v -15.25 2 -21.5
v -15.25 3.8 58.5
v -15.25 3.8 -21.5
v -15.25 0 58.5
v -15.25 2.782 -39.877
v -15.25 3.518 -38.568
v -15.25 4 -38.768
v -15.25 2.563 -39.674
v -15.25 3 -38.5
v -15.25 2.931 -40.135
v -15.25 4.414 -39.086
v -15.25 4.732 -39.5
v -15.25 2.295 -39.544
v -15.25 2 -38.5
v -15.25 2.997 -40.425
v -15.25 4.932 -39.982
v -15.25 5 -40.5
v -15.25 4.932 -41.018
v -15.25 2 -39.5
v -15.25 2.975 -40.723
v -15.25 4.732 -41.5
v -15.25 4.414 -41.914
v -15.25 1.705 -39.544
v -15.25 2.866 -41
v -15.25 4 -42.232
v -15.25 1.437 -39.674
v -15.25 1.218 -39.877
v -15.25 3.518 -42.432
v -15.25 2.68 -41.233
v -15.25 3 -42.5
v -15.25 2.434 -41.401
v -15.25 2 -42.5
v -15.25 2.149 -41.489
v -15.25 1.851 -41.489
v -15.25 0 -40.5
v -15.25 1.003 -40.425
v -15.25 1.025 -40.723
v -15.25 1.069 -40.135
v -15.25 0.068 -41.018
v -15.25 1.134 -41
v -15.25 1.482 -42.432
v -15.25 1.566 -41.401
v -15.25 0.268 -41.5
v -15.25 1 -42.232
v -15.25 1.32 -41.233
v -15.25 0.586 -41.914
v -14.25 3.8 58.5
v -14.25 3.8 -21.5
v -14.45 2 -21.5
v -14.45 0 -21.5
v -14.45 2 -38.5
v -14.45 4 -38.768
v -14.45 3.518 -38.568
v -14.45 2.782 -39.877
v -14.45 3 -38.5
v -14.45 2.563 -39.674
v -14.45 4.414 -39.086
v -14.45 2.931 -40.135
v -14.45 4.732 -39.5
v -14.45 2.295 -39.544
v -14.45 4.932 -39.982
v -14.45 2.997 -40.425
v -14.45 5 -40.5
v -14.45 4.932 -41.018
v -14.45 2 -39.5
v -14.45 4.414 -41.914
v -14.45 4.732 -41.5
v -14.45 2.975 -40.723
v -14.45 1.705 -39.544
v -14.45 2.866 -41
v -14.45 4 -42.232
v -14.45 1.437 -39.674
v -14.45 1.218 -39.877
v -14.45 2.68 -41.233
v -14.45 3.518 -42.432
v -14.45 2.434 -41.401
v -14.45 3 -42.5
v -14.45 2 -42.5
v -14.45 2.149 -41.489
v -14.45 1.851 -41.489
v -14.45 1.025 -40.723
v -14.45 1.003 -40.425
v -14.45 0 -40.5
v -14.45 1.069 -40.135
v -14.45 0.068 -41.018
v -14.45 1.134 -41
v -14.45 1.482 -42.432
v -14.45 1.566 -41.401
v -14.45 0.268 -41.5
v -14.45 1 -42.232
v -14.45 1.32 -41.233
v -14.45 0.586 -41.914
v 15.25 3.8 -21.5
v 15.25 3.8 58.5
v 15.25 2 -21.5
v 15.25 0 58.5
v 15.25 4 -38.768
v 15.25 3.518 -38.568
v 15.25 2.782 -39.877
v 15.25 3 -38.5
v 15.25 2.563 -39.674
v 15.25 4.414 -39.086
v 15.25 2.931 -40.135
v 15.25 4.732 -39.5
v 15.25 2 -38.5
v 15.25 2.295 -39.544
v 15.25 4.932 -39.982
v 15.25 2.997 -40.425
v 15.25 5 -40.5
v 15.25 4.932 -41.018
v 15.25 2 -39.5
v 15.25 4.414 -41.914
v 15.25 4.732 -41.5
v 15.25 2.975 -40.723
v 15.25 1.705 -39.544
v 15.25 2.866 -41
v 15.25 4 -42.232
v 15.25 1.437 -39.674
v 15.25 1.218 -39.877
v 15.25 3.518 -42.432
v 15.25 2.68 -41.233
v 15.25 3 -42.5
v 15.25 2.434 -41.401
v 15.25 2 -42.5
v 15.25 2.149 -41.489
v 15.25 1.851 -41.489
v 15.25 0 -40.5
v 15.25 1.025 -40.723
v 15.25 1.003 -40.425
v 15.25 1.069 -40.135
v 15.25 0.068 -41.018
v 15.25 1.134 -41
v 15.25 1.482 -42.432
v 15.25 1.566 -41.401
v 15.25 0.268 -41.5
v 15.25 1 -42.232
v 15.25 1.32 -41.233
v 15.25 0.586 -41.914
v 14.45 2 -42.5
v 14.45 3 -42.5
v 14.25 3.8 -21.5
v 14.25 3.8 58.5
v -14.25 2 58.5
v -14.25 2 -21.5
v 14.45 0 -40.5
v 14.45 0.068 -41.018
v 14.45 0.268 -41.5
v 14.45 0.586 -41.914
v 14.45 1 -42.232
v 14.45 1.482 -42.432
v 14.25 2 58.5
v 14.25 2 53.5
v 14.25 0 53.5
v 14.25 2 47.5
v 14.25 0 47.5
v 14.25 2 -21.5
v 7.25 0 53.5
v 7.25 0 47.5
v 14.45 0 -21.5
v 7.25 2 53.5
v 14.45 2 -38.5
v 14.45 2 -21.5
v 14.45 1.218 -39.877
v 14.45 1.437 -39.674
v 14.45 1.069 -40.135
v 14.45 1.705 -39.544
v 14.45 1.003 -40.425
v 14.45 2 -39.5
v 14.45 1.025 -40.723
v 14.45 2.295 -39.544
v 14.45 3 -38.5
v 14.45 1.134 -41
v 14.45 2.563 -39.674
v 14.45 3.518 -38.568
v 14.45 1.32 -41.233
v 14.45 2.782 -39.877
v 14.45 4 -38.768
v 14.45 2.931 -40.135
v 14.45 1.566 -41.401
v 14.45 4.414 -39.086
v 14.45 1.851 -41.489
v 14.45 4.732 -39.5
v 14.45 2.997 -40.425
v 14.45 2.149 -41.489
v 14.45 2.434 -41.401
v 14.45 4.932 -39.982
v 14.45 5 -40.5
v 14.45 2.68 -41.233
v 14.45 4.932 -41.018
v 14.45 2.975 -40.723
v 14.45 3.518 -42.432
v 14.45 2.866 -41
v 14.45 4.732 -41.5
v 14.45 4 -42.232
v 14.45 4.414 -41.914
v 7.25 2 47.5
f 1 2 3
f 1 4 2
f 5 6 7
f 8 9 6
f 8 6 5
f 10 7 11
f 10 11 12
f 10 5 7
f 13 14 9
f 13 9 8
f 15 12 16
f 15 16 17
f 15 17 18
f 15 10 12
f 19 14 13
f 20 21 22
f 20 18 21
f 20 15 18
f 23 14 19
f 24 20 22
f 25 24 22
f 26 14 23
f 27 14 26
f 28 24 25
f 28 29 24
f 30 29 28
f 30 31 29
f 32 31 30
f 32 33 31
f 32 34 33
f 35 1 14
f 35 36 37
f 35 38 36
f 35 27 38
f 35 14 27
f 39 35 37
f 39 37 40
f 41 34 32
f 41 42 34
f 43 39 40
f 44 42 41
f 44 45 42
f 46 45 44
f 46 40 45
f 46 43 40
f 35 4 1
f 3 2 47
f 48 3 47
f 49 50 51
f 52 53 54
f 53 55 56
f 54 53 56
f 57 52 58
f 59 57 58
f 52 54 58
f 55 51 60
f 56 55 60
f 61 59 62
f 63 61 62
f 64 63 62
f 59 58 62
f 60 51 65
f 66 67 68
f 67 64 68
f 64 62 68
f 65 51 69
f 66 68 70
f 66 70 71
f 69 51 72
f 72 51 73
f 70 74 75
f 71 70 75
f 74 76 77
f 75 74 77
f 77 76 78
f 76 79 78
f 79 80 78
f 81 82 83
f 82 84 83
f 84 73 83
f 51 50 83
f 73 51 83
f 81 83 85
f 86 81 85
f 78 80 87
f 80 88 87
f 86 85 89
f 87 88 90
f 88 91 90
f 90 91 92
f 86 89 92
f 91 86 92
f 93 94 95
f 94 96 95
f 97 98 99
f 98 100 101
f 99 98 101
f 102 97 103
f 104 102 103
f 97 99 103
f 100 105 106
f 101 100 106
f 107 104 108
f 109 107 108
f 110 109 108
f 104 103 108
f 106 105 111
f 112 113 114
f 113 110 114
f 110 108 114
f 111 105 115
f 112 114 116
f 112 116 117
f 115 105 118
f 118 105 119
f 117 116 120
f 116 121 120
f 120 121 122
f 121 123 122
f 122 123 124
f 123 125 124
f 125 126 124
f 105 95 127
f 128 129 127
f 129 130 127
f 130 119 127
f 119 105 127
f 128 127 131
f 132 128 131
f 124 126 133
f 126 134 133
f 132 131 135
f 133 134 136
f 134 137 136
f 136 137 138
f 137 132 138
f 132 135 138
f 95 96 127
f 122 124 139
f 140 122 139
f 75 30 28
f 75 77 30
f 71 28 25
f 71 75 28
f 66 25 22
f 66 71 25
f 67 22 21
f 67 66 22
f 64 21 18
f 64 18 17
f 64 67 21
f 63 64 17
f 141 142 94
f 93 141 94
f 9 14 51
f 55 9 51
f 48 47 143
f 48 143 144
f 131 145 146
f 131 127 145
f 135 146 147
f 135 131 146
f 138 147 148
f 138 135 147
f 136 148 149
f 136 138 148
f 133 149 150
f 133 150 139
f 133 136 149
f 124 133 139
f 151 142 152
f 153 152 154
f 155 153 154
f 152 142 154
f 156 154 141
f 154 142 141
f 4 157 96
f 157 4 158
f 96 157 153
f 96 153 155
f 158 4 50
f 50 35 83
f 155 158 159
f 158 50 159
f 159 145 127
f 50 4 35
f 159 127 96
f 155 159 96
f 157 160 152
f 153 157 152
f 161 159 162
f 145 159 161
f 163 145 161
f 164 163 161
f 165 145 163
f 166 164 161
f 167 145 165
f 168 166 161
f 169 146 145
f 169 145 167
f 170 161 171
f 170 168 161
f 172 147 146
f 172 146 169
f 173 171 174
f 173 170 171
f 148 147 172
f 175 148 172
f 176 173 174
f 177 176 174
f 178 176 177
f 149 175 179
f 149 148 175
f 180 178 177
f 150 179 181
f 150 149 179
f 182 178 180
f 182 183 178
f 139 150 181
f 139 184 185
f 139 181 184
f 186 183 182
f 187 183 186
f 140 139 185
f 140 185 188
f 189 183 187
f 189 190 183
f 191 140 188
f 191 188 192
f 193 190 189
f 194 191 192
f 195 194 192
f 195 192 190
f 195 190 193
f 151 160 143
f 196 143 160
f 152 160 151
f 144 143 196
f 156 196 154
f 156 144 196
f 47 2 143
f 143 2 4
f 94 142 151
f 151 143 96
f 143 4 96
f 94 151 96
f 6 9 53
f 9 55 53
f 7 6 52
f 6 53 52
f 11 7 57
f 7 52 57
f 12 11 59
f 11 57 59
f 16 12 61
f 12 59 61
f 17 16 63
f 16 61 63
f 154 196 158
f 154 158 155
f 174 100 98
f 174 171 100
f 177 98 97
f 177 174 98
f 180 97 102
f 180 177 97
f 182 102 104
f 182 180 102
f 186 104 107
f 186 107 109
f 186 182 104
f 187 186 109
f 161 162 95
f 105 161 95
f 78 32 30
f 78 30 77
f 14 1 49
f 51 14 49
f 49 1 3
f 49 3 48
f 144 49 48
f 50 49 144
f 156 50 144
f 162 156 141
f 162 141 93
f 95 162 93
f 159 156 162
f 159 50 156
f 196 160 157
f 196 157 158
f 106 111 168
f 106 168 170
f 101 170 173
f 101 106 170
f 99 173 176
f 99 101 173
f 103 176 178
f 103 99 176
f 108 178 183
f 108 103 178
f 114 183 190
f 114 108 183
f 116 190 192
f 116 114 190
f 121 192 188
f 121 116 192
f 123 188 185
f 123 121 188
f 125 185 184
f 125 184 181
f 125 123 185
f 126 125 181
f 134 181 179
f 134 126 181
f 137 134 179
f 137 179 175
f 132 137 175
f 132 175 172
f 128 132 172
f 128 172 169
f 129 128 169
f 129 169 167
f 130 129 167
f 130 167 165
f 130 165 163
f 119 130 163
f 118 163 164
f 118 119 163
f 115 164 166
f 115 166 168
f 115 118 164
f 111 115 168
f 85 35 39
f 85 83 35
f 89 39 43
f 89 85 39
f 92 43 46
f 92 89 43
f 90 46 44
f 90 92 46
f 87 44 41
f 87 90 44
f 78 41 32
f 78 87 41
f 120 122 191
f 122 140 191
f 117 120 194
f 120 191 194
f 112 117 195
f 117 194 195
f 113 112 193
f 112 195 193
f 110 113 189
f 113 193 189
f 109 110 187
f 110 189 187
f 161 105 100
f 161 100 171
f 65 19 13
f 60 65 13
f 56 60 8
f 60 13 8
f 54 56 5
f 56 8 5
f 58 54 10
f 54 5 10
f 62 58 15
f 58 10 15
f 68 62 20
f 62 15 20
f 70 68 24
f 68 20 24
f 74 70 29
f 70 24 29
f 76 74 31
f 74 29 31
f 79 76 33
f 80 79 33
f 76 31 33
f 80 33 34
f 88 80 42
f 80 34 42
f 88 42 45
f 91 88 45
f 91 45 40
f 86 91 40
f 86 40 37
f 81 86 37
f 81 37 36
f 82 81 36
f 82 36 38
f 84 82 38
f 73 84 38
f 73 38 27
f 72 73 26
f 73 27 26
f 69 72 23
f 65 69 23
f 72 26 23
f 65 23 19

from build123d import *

# Parameters (mm, degrees)
SKETCH1_W           = 30.5
SKETCH1_H           = 85
BOSS_EXTRUDE1_DEPTH = 2
CUT_EXTRUDE1_DEPTH  = 2
SKETCH5_W           = 0.8
SKETCH5_H           = 4
BOSS_EXTRUDE2_DEPTH = 3
SKETCH6_R           = 1
CUT_EXTRUDE2_DEPTH  = 0.8
FILLET1_R           = 2
FILLET2_R           = 2
SKETCH7_W           = 30.5
SKETCH7_H           = 2
BOSS_EXTRUDE3_DEPTH = 16
SKETCH8_W           = 30.5
SKETCH8_H           = 80
BOSS_EXTRUDE4_DEPTH = 1.8
SKETCH9_W           = 28.5
SKETCH9_H           = 80
CUT_EXTRUDE3_DEPTH  = 1.8
SKETCH10_W          = 28.9
SKETCH10_H          = 2
CUT_EXTRUDE4_DEPTH  = 1
SKETCH11_W          = 7
SKETCH11_H          = 6
CUT_EXTRUDE5_DEPTH  = 2


with BuildPart() as part:
    # Sketch1 → Boss-Extrude1 (new body)
    with BuildSketch(Plane(origin=(0, 0, 0), x_dir=(1, 0, 0), z_dir=(0, 1, 0))):
        Rectangle(SKETCH1_W, SKETCH1_H)
    extrude(amount=BOSS_EXTRUDE1_DEPTH)

    # Sketch2 → Cut-Extrude1 (cut)
    with BuildSketch(Plane(origin=(0, 2, 0), x_dir=(1, 0, 0), z_dir=(0, 1, 0))):
        Polygon((14.45, 42.5), (-14.45, 42.5), (-14.45, 24.5), (-14.45, 22.5), (14.45, 22.5), (14.45, 24.5), align=None)
    extrude(amount=-CUT_EXTRUDE1_DEPTH, mode=Mode.SUBTRACT)

    # Sketch5 → Boss-Extrude2 (add)
    with BuildSketch(Plane(origin=(0, 2, 0), x_dir=(1, 0, 0), z_dir=(0, 1, 0))):
        with Locations((-14.85, 40.5)):
            Rectangle(SKETCH5_W, SKETCH5_H)
    boss_extrude2 = extrude(amount=BOSS_EXTRUDE2_DEPTH)

    # Sketch6 → Cut-Extrude2 (cut)
    with BuildSketch(Plane.ZY.offset(15.25)):
        with Locations((-40.5, 2)):
            Circle(SKETCH6_R)
    cut_extrude2 = extrude(amount=-CUT_EXTRUDE2_DEPTH, mode=Mode.SUBTRACT)

    # Mirror1: Boss-Extrude2, Cut-Extrude2 across plane
    add(boss_extrude2.mirror(Plane(origin=(0, 0, 0), x_dir=(0, 0, 1), z_dir=(1, 0, 0))))
    add(cut_extrude2.mirror(Plane(origin=(0, 0, 0), x_dir=(0, 0, 1), z_dir=(1, 0, 0))), mode=Mode.SUBTRACT)

    # Fillet1
    fillet1_edges = [part.edges().sort_by_distance(p)[0] for p in [
        (-14.85, 0, -42.5),
        (-14.85, 5, -42.5),
        (-14.85, 5, -38.5),
    ]]
    fillet(fillet1_edges, radius=FILLET1_R - 0.0001)  # a hair under: the kernel refuses the full size

    # Fillet2
    fillet2_edges = [part.edges().sort_by_distance(p)[0] for p in [
        (14.85, 0, -42.5),
        (14.85, 5, -38.5),
        (14.85, 5, -42.5),
    ]]
    fillet(fillet2_edges, radius=FILLET2_R - 0.0001)  # a hair under: the kernel refuses the full size

    # Sketch7 → Boss-Extrude3 (add)
    with BuildSketch(Plane.XY.offset(42.5)):
        with Locations((0, 1)):
            Rectangle(SKETCH7_W, SKETCH7_H)
    extrude(amount=BOSS_EXTRUDE3_DEPTH)

    # Sketch8 → Boss-Extrude4 (add)
    with BuildSketch(Plane(origin=(0, 2, 0), x_dir=(1, 0, 0), z_dir=(0, 1, 0))):
        with Locations((0, -18.5)):
            Rectangle(SKETCH8_W, SKETCH8_H)
    extrude(amount=BOSS_EXTRUDE4_DEPTH)

    # Sketch9 → Cut-Extrude3 (cut)
    with BuildSketch(Plane(origin=(0, 3.8, 0), x_dir=(1, 0, 0), z_dir=(0, 1, 0))):
        with Locations((0, -18.5)):
            Rectangle(SKETCH9_W, SKETCH9_H)
    extrude(amount=-CUT_EXTRUDE3_DEPTH, mode=Mode.SUBTRACT)

    # Sketch10 → Cut-Extrude4 (cut)
    with BuildSketch(Plane(origin=(0, 0, -22.5), x_dir=(-1, 0, 0), z_dir=(0, 0, -1))):
        with Locations((0, 1)):
            Rectangle(SKETCH10_W, SKETCH10_H)
    extrude(amount=-CUT_EXTRUDE4_DEPTH, mode=Mode.SUBTRACT)

    # Sketch11 → Cut-Extrude5 (cut)
    with BuildSketch(Plane(origin=(0, 2, 0), x_dir=(1, 0, 0), z_dir=(0, 1, 0))):
        with Locations((10.75, -50.5)):
            Rectangle(SKETCH11_W, SKETCH11_H)
    extrude(amount=-CUT_EXTRUDE5_DEPTH, mode=Mode.SUBTRACT)


solid = part.part
